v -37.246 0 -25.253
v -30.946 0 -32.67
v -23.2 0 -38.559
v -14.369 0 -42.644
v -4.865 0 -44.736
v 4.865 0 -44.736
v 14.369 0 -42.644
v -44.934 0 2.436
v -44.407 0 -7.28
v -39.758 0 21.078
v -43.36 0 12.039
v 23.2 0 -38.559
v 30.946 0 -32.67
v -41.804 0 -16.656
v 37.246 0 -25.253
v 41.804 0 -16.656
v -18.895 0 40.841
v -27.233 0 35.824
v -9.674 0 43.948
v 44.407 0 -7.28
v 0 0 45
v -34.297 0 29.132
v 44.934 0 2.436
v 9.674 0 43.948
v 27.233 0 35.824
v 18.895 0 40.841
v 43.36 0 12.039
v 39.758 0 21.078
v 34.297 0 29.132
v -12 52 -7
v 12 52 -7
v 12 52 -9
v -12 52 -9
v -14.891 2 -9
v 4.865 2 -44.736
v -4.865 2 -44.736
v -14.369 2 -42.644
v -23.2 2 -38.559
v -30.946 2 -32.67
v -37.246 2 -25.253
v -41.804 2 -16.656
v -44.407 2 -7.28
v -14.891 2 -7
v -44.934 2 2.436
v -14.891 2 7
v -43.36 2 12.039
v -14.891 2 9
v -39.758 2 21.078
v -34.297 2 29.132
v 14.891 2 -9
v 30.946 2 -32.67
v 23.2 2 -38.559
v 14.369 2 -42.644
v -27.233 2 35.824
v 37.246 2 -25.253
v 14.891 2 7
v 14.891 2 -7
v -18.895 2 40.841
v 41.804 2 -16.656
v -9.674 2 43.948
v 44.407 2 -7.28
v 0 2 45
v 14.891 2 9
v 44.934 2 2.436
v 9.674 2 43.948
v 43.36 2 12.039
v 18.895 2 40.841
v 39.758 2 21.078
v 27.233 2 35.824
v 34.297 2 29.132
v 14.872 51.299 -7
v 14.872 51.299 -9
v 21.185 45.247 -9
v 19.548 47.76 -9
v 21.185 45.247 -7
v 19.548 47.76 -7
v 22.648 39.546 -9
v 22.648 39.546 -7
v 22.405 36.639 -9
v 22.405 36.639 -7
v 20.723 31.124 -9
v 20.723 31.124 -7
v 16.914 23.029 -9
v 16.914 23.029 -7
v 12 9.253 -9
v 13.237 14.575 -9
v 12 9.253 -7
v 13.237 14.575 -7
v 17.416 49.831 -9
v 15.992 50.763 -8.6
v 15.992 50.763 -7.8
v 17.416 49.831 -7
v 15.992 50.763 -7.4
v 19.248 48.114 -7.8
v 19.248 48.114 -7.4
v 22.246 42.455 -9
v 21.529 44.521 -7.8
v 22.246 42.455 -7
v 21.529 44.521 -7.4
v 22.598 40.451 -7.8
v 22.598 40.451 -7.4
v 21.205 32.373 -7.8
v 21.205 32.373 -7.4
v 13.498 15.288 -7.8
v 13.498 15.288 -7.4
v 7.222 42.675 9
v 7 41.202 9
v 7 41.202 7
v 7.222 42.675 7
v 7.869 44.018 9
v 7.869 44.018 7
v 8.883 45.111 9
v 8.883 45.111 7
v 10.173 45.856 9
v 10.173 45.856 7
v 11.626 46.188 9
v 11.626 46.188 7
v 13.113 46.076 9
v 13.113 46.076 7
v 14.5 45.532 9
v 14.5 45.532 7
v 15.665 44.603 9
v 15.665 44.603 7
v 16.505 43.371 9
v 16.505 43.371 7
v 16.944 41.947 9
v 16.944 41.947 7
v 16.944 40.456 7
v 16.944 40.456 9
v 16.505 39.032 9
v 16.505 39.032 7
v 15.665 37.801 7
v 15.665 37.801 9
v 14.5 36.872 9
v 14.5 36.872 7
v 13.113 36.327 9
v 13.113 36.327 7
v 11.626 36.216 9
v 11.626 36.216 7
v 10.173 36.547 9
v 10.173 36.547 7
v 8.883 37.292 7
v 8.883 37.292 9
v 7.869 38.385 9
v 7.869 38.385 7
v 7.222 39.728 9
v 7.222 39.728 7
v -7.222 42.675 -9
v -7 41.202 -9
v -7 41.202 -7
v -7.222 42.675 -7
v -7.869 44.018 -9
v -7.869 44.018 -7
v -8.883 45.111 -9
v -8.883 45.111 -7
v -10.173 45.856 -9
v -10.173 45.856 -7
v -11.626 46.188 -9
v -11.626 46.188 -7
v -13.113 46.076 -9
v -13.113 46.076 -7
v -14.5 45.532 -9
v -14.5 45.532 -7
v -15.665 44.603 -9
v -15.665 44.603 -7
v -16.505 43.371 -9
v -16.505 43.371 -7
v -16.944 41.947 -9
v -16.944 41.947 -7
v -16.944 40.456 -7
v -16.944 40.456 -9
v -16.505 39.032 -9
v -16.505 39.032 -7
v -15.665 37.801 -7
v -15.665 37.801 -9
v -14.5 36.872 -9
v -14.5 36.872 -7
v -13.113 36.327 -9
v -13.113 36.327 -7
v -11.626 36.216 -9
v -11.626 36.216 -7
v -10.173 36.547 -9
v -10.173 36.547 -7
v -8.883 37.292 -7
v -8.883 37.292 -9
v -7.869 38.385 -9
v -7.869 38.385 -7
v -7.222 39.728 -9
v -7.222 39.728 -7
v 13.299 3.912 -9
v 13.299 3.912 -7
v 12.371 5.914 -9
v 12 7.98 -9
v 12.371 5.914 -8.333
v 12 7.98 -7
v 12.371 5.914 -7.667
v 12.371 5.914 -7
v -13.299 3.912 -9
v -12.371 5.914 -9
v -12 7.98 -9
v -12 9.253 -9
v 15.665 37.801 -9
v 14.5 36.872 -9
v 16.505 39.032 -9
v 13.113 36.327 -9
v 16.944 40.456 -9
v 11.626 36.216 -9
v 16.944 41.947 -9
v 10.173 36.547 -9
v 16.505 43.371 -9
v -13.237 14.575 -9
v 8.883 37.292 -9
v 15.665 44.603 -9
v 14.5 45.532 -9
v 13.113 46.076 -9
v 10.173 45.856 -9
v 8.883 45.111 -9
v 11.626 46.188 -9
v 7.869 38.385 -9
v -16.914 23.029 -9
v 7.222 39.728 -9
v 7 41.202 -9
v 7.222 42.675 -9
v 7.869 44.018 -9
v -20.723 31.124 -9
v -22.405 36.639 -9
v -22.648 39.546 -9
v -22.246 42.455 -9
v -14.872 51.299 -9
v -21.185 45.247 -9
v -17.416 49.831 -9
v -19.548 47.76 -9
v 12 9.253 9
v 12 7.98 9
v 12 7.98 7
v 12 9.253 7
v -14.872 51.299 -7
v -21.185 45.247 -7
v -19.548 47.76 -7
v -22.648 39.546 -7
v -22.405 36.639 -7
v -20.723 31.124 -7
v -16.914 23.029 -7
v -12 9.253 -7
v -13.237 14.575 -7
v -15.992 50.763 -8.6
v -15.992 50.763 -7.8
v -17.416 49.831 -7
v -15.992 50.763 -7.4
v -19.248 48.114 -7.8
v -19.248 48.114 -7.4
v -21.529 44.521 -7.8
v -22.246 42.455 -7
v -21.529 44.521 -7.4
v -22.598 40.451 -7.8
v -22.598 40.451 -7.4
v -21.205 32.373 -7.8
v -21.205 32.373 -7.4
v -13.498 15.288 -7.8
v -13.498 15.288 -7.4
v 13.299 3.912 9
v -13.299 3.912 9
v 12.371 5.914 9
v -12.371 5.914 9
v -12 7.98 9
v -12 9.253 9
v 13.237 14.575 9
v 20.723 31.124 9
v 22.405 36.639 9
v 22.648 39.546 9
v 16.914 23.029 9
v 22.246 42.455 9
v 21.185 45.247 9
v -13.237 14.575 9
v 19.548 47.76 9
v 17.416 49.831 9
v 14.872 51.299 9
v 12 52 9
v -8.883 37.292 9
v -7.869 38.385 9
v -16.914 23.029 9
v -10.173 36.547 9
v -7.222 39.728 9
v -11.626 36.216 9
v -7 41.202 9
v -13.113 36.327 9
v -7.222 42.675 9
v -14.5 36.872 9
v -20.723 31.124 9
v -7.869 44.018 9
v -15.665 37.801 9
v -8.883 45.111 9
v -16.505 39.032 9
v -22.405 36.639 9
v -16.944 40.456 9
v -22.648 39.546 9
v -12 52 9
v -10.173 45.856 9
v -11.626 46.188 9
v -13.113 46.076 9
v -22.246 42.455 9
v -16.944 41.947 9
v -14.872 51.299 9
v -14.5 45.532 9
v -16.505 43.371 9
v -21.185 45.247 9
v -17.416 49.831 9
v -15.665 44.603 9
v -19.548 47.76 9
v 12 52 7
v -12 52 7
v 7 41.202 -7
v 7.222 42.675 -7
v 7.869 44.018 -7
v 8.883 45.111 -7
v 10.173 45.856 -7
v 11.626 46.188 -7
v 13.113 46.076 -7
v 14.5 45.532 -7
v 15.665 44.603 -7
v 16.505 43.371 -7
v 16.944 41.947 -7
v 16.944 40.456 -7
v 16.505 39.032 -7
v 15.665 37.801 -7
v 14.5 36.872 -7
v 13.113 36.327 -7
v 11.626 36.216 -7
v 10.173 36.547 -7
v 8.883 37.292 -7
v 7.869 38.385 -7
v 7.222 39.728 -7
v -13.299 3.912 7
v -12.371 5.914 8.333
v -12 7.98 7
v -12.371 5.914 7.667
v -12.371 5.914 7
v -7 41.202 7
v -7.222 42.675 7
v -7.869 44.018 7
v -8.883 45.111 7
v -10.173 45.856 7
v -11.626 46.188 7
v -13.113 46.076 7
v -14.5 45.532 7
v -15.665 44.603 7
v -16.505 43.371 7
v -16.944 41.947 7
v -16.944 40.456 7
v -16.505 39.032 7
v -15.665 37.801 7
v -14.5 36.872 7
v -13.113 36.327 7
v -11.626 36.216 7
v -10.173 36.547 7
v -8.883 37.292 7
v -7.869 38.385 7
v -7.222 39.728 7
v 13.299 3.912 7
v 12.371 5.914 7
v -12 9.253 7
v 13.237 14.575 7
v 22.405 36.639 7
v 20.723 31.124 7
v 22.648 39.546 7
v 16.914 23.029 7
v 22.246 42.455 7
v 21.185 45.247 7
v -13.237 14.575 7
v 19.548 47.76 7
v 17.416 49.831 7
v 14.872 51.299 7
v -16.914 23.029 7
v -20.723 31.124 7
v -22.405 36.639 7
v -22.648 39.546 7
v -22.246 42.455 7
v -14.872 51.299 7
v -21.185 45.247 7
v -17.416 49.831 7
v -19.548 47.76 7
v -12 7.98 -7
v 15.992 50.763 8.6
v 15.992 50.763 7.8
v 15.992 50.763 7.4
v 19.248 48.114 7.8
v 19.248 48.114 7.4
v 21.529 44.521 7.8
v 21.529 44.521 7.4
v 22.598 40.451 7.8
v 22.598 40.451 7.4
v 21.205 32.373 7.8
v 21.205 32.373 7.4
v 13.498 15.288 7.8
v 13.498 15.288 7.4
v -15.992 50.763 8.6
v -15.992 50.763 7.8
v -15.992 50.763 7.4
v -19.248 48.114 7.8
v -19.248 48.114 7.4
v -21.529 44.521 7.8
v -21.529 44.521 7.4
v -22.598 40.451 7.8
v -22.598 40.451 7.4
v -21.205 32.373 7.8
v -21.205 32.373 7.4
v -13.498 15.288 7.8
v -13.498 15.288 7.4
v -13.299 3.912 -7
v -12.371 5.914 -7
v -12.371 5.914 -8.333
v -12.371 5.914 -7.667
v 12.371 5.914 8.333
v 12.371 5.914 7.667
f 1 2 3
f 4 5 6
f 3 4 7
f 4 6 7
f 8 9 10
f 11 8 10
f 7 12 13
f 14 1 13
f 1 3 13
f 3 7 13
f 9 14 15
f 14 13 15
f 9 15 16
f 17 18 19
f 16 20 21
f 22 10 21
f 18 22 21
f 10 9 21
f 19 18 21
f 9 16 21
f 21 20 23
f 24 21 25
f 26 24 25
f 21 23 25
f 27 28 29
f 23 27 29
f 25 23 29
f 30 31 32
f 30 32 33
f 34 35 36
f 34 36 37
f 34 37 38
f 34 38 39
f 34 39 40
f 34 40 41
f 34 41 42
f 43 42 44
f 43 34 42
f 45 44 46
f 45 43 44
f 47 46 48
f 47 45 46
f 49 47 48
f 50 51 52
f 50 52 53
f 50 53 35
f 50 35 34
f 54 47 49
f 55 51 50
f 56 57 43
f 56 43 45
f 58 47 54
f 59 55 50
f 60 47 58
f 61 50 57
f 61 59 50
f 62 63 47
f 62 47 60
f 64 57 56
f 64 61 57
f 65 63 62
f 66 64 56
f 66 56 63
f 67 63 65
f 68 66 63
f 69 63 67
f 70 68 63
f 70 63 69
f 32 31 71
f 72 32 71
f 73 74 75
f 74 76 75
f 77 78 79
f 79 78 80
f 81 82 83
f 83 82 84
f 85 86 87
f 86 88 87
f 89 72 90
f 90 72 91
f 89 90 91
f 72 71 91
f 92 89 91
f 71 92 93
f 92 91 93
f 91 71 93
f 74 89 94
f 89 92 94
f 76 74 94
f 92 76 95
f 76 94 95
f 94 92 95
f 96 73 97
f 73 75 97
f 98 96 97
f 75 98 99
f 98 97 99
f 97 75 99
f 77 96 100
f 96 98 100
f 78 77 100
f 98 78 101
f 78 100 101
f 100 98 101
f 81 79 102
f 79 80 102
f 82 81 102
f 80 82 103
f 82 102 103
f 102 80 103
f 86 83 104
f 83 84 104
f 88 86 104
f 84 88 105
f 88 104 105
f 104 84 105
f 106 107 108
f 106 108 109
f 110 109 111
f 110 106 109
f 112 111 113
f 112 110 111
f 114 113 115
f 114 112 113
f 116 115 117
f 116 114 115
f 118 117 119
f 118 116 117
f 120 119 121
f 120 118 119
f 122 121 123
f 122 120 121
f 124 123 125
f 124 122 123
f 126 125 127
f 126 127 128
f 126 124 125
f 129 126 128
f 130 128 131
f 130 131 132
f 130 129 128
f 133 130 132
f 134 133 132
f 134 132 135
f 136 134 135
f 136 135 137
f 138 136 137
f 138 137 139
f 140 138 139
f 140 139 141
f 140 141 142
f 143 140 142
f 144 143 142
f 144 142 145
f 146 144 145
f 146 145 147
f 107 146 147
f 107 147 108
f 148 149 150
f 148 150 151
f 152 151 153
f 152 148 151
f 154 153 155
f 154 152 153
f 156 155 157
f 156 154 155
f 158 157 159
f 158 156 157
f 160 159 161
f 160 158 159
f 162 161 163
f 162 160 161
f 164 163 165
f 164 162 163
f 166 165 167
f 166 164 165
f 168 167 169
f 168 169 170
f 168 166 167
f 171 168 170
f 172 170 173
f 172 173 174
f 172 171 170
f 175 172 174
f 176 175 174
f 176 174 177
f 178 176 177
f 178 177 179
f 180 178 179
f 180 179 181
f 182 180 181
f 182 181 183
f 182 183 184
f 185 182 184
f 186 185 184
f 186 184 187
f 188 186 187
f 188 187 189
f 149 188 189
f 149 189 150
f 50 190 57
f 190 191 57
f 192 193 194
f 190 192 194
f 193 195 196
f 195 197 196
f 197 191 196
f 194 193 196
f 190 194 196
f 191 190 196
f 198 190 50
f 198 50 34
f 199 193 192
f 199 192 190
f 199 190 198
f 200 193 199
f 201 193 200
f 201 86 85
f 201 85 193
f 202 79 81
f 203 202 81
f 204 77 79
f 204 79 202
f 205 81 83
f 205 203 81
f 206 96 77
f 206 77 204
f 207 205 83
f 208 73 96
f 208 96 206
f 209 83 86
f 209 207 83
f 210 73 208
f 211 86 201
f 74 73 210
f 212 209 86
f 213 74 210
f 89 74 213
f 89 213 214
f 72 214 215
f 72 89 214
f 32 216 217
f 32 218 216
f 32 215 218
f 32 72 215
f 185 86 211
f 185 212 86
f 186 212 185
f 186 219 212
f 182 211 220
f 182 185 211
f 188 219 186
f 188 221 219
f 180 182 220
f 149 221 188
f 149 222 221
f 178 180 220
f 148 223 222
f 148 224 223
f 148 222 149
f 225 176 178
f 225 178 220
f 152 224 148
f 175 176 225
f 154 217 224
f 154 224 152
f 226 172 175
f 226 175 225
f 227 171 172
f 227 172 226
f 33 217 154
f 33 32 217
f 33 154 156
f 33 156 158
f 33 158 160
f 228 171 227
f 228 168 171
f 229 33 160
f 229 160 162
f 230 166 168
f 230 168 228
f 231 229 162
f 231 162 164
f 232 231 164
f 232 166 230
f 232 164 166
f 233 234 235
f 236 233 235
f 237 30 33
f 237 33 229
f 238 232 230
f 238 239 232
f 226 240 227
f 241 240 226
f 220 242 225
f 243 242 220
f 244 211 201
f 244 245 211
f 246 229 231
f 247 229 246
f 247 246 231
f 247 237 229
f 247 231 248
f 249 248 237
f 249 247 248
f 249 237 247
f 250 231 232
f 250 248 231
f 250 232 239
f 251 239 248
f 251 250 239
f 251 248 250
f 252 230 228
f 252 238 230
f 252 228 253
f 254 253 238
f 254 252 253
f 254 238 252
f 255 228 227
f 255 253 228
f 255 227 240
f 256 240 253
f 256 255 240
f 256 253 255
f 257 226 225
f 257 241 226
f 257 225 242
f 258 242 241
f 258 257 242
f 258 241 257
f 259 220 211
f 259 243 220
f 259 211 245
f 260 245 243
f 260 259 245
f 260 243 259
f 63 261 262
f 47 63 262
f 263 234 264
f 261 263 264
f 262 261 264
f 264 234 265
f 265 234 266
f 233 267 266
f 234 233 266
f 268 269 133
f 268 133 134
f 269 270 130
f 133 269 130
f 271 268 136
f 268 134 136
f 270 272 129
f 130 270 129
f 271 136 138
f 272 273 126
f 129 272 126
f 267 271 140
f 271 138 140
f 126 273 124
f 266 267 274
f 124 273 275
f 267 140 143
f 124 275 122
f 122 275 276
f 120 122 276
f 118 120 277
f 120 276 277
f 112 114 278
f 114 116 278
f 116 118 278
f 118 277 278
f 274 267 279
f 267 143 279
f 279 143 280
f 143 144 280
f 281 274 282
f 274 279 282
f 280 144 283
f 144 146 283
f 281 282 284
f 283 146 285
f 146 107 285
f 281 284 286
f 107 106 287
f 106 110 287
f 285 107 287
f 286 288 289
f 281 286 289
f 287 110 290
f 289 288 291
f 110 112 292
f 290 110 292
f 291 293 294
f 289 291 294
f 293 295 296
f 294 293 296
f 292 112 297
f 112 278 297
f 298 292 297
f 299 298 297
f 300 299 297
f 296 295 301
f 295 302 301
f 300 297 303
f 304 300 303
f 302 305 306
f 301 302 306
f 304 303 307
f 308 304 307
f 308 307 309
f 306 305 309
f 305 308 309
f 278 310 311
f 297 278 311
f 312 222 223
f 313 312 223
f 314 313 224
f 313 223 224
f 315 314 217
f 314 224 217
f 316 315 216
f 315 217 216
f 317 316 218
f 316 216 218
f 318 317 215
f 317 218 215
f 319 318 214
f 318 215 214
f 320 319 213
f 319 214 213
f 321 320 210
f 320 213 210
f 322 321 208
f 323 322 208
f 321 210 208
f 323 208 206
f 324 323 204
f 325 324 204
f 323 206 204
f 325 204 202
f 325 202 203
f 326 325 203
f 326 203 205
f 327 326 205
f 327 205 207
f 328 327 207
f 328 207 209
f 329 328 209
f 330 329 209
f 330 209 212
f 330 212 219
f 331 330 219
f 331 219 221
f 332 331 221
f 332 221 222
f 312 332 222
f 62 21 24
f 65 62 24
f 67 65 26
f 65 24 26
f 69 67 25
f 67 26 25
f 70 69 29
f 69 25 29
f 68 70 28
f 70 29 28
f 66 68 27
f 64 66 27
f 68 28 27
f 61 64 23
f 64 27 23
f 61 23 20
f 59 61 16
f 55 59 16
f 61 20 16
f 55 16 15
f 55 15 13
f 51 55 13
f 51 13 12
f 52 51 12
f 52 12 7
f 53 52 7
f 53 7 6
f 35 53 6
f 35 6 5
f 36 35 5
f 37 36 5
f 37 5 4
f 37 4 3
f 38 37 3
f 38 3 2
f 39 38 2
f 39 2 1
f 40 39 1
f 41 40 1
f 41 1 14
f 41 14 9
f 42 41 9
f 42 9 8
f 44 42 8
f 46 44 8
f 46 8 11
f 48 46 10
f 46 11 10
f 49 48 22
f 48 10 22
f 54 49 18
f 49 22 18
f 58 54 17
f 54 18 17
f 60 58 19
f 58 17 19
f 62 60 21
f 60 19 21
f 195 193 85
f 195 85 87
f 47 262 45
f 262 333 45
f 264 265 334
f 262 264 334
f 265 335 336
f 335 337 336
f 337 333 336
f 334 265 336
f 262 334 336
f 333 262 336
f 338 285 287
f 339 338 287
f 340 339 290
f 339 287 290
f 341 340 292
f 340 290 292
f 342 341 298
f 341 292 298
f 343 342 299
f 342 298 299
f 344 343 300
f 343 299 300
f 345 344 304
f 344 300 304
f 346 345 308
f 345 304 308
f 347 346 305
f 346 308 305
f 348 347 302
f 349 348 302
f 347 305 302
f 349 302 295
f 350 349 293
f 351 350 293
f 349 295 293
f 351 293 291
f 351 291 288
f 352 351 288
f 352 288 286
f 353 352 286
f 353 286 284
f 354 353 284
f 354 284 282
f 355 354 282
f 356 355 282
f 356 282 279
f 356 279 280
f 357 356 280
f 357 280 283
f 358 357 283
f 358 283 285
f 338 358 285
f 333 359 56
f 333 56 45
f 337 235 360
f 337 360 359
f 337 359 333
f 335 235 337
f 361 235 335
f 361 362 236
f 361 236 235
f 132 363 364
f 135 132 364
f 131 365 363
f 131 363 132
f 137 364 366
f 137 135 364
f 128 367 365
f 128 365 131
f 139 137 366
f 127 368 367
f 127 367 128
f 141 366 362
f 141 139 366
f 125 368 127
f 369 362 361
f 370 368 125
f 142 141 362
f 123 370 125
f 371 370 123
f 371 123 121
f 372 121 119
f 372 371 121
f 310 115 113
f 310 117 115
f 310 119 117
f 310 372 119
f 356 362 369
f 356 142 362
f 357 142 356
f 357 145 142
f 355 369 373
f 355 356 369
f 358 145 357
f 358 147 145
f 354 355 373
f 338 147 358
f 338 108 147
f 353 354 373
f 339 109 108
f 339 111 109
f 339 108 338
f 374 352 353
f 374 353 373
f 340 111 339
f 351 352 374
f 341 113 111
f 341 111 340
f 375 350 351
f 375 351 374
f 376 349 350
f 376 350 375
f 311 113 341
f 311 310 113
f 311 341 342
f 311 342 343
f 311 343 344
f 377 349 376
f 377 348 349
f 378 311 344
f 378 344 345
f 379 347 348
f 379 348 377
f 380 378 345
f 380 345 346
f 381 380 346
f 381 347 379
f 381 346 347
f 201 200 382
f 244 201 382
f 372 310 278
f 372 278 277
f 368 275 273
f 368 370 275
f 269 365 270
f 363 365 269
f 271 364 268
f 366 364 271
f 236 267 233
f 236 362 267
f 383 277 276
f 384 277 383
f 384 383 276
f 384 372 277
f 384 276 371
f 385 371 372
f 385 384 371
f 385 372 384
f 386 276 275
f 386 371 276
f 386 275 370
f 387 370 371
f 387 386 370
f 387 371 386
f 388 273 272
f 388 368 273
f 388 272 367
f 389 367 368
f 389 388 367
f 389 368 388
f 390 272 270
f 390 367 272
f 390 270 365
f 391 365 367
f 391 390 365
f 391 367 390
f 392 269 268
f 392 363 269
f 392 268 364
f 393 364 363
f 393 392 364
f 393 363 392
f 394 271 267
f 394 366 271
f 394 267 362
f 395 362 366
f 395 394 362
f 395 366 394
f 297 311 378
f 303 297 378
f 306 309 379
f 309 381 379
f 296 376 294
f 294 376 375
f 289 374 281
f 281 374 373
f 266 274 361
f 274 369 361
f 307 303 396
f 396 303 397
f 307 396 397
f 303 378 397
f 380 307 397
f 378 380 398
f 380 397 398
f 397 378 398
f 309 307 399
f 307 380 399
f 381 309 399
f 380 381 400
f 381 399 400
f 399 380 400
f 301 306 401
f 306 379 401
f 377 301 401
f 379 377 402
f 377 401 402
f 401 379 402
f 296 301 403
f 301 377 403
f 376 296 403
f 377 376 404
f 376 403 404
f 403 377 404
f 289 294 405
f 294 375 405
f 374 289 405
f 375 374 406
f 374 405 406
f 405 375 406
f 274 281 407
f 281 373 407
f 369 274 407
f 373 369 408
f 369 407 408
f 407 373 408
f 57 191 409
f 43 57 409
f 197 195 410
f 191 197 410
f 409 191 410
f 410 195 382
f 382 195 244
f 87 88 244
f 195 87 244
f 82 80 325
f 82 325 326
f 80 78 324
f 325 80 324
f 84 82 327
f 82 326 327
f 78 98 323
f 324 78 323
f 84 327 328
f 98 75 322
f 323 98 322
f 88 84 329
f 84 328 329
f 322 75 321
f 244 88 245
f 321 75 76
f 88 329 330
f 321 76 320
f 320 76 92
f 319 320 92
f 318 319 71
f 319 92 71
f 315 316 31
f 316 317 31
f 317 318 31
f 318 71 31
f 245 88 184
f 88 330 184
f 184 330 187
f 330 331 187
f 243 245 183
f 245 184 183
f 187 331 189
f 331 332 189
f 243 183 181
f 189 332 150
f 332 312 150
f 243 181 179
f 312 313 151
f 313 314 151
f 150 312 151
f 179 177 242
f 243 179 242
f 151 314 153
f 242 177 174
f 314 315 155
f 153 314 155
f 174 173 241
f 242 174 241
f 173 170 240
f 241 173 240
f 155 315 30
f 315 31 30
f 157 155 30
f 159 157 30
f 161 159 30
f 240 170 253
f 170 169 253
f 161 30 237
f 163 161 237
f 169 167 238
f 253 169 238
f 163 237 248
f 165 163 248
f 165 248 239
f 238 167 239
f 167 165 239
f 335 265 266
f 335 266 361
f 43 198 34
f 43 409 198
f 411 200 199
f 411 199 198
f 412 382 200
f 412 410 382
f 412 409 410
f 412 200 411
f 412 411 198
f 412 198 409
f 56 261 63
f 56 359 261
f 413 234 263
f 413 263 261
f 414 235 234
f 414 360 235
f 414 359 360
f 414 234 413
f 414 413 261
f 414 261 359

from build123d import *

# Parameters (mm, degrees)
SKETCH1_R           = 45
BOSS_EXTRUDE1_DEPTH = 2
SKETCH2_W           = 12
SKETCH2_H           = 2
BOSS_EXTRUDE2_DEPTH = 50
BOSS_EXTRUDE3_START = -2
BOSS_EXTRUDE3_DEPTH = 2
SKETCH4_R           = 5
CUT_EXTRUDE1_DEPTH  = 50


# Read off the part's stored shape, not the designer's step: Boss-Extrude3
with BuildPart() as part:
    # Sketch1 → Boss-Extrude1 (new body)
    with BuildSketch(Plane(origin=(0, 0, 0), x_dir=(1, 0, 0), z_dir=(0, 1, 0))):
        with Locations(Location((0, 0, 0), (0, 0, 270))):
            Circle(SKETCH1_R)
    extrude(amount=BOSS_EXTRUDE1_DEPTH)

    # Sketch2 → Boss-Extrude2 (add)
    with BuildSketch(Plane(origin=(0, 2, 0), x_dir=(1, 0, 0), z_dir=(0, 1, 0))):
        with Locations((-6, -8)):
            Rectangle(SKETCH2_W, SKETCH2_H)
    extrude(amount=BOSS_EXTRUDE2_DEPTH)

    # Boss-Extrude3 outline → Boss-Extrude3 (add)
    with BuildSketch(Plane.XY.offset(9).offset(BOSS_EXTRUDE3_START)):
        with BuildLine():
            Line((-12, 9.252585755), (-12, 52))
            add(Edge.make_bspline(
                [(-12, 52), (-17.707608273, 51.500079533), (-24.252880777, 43.259732346), (-21.397540076, 31.962524142), (-17.33880503, 23.974508646), (-13.768744124, 16.530528707), (-12.117269051, 11.269699014), (-12, 9.252585755)],
                knots=[0, 0, 0, 0, 0.28798008, 0.430455664, 0.586456405, 0.756216635, 0.864299894, 0.864299894, 0.864299894, 0.864299894], degree=3))
        make_face()
        with BuildLine():
            Line((-12, 2), (-12, 7.979725632))
            add(Edge.make_bspline(
                [(-12, 7.979725632), (-12.129131204, 5.890942784), (-12.929877772, 3.858184366), (-14.891007751, 2)],
                knots=[0.887122224, 0.887122224, 0.887122224, 0.887122224, 1, 1, 1, 1], degree=3))
            Line((-14.891007751, 2), (-12, 2))
        make_face()
    extrude(amount=BOSS_EXTRUDE3_DEPTH)

    # Sketch4 → Cut-Extrude1 (cut)
    with BuildSketch(Plane.XY.offset(9)):
        with Locations((-12, 41.201646807)):
            Circle(SKETCH4_R)
    extrude(amount=-CUT_EXTRUDE1_DEPTH, mode=Mode.SUBTRACT)

    # Mirror1: part across plane


with BuildPart() as part_1:
    add(part.part)
    add(part.part.mirror(Plane(origin=(0, 52, 0), x_dir=(0, 0, 1), z_dir=(1, 0, 0))))

    # Mirror2: part across plane


with BuildPart() as part_2:
    add(part_1.part)
    add(part_1.part.mirror(Plane.XY))


solid = part_2.part
